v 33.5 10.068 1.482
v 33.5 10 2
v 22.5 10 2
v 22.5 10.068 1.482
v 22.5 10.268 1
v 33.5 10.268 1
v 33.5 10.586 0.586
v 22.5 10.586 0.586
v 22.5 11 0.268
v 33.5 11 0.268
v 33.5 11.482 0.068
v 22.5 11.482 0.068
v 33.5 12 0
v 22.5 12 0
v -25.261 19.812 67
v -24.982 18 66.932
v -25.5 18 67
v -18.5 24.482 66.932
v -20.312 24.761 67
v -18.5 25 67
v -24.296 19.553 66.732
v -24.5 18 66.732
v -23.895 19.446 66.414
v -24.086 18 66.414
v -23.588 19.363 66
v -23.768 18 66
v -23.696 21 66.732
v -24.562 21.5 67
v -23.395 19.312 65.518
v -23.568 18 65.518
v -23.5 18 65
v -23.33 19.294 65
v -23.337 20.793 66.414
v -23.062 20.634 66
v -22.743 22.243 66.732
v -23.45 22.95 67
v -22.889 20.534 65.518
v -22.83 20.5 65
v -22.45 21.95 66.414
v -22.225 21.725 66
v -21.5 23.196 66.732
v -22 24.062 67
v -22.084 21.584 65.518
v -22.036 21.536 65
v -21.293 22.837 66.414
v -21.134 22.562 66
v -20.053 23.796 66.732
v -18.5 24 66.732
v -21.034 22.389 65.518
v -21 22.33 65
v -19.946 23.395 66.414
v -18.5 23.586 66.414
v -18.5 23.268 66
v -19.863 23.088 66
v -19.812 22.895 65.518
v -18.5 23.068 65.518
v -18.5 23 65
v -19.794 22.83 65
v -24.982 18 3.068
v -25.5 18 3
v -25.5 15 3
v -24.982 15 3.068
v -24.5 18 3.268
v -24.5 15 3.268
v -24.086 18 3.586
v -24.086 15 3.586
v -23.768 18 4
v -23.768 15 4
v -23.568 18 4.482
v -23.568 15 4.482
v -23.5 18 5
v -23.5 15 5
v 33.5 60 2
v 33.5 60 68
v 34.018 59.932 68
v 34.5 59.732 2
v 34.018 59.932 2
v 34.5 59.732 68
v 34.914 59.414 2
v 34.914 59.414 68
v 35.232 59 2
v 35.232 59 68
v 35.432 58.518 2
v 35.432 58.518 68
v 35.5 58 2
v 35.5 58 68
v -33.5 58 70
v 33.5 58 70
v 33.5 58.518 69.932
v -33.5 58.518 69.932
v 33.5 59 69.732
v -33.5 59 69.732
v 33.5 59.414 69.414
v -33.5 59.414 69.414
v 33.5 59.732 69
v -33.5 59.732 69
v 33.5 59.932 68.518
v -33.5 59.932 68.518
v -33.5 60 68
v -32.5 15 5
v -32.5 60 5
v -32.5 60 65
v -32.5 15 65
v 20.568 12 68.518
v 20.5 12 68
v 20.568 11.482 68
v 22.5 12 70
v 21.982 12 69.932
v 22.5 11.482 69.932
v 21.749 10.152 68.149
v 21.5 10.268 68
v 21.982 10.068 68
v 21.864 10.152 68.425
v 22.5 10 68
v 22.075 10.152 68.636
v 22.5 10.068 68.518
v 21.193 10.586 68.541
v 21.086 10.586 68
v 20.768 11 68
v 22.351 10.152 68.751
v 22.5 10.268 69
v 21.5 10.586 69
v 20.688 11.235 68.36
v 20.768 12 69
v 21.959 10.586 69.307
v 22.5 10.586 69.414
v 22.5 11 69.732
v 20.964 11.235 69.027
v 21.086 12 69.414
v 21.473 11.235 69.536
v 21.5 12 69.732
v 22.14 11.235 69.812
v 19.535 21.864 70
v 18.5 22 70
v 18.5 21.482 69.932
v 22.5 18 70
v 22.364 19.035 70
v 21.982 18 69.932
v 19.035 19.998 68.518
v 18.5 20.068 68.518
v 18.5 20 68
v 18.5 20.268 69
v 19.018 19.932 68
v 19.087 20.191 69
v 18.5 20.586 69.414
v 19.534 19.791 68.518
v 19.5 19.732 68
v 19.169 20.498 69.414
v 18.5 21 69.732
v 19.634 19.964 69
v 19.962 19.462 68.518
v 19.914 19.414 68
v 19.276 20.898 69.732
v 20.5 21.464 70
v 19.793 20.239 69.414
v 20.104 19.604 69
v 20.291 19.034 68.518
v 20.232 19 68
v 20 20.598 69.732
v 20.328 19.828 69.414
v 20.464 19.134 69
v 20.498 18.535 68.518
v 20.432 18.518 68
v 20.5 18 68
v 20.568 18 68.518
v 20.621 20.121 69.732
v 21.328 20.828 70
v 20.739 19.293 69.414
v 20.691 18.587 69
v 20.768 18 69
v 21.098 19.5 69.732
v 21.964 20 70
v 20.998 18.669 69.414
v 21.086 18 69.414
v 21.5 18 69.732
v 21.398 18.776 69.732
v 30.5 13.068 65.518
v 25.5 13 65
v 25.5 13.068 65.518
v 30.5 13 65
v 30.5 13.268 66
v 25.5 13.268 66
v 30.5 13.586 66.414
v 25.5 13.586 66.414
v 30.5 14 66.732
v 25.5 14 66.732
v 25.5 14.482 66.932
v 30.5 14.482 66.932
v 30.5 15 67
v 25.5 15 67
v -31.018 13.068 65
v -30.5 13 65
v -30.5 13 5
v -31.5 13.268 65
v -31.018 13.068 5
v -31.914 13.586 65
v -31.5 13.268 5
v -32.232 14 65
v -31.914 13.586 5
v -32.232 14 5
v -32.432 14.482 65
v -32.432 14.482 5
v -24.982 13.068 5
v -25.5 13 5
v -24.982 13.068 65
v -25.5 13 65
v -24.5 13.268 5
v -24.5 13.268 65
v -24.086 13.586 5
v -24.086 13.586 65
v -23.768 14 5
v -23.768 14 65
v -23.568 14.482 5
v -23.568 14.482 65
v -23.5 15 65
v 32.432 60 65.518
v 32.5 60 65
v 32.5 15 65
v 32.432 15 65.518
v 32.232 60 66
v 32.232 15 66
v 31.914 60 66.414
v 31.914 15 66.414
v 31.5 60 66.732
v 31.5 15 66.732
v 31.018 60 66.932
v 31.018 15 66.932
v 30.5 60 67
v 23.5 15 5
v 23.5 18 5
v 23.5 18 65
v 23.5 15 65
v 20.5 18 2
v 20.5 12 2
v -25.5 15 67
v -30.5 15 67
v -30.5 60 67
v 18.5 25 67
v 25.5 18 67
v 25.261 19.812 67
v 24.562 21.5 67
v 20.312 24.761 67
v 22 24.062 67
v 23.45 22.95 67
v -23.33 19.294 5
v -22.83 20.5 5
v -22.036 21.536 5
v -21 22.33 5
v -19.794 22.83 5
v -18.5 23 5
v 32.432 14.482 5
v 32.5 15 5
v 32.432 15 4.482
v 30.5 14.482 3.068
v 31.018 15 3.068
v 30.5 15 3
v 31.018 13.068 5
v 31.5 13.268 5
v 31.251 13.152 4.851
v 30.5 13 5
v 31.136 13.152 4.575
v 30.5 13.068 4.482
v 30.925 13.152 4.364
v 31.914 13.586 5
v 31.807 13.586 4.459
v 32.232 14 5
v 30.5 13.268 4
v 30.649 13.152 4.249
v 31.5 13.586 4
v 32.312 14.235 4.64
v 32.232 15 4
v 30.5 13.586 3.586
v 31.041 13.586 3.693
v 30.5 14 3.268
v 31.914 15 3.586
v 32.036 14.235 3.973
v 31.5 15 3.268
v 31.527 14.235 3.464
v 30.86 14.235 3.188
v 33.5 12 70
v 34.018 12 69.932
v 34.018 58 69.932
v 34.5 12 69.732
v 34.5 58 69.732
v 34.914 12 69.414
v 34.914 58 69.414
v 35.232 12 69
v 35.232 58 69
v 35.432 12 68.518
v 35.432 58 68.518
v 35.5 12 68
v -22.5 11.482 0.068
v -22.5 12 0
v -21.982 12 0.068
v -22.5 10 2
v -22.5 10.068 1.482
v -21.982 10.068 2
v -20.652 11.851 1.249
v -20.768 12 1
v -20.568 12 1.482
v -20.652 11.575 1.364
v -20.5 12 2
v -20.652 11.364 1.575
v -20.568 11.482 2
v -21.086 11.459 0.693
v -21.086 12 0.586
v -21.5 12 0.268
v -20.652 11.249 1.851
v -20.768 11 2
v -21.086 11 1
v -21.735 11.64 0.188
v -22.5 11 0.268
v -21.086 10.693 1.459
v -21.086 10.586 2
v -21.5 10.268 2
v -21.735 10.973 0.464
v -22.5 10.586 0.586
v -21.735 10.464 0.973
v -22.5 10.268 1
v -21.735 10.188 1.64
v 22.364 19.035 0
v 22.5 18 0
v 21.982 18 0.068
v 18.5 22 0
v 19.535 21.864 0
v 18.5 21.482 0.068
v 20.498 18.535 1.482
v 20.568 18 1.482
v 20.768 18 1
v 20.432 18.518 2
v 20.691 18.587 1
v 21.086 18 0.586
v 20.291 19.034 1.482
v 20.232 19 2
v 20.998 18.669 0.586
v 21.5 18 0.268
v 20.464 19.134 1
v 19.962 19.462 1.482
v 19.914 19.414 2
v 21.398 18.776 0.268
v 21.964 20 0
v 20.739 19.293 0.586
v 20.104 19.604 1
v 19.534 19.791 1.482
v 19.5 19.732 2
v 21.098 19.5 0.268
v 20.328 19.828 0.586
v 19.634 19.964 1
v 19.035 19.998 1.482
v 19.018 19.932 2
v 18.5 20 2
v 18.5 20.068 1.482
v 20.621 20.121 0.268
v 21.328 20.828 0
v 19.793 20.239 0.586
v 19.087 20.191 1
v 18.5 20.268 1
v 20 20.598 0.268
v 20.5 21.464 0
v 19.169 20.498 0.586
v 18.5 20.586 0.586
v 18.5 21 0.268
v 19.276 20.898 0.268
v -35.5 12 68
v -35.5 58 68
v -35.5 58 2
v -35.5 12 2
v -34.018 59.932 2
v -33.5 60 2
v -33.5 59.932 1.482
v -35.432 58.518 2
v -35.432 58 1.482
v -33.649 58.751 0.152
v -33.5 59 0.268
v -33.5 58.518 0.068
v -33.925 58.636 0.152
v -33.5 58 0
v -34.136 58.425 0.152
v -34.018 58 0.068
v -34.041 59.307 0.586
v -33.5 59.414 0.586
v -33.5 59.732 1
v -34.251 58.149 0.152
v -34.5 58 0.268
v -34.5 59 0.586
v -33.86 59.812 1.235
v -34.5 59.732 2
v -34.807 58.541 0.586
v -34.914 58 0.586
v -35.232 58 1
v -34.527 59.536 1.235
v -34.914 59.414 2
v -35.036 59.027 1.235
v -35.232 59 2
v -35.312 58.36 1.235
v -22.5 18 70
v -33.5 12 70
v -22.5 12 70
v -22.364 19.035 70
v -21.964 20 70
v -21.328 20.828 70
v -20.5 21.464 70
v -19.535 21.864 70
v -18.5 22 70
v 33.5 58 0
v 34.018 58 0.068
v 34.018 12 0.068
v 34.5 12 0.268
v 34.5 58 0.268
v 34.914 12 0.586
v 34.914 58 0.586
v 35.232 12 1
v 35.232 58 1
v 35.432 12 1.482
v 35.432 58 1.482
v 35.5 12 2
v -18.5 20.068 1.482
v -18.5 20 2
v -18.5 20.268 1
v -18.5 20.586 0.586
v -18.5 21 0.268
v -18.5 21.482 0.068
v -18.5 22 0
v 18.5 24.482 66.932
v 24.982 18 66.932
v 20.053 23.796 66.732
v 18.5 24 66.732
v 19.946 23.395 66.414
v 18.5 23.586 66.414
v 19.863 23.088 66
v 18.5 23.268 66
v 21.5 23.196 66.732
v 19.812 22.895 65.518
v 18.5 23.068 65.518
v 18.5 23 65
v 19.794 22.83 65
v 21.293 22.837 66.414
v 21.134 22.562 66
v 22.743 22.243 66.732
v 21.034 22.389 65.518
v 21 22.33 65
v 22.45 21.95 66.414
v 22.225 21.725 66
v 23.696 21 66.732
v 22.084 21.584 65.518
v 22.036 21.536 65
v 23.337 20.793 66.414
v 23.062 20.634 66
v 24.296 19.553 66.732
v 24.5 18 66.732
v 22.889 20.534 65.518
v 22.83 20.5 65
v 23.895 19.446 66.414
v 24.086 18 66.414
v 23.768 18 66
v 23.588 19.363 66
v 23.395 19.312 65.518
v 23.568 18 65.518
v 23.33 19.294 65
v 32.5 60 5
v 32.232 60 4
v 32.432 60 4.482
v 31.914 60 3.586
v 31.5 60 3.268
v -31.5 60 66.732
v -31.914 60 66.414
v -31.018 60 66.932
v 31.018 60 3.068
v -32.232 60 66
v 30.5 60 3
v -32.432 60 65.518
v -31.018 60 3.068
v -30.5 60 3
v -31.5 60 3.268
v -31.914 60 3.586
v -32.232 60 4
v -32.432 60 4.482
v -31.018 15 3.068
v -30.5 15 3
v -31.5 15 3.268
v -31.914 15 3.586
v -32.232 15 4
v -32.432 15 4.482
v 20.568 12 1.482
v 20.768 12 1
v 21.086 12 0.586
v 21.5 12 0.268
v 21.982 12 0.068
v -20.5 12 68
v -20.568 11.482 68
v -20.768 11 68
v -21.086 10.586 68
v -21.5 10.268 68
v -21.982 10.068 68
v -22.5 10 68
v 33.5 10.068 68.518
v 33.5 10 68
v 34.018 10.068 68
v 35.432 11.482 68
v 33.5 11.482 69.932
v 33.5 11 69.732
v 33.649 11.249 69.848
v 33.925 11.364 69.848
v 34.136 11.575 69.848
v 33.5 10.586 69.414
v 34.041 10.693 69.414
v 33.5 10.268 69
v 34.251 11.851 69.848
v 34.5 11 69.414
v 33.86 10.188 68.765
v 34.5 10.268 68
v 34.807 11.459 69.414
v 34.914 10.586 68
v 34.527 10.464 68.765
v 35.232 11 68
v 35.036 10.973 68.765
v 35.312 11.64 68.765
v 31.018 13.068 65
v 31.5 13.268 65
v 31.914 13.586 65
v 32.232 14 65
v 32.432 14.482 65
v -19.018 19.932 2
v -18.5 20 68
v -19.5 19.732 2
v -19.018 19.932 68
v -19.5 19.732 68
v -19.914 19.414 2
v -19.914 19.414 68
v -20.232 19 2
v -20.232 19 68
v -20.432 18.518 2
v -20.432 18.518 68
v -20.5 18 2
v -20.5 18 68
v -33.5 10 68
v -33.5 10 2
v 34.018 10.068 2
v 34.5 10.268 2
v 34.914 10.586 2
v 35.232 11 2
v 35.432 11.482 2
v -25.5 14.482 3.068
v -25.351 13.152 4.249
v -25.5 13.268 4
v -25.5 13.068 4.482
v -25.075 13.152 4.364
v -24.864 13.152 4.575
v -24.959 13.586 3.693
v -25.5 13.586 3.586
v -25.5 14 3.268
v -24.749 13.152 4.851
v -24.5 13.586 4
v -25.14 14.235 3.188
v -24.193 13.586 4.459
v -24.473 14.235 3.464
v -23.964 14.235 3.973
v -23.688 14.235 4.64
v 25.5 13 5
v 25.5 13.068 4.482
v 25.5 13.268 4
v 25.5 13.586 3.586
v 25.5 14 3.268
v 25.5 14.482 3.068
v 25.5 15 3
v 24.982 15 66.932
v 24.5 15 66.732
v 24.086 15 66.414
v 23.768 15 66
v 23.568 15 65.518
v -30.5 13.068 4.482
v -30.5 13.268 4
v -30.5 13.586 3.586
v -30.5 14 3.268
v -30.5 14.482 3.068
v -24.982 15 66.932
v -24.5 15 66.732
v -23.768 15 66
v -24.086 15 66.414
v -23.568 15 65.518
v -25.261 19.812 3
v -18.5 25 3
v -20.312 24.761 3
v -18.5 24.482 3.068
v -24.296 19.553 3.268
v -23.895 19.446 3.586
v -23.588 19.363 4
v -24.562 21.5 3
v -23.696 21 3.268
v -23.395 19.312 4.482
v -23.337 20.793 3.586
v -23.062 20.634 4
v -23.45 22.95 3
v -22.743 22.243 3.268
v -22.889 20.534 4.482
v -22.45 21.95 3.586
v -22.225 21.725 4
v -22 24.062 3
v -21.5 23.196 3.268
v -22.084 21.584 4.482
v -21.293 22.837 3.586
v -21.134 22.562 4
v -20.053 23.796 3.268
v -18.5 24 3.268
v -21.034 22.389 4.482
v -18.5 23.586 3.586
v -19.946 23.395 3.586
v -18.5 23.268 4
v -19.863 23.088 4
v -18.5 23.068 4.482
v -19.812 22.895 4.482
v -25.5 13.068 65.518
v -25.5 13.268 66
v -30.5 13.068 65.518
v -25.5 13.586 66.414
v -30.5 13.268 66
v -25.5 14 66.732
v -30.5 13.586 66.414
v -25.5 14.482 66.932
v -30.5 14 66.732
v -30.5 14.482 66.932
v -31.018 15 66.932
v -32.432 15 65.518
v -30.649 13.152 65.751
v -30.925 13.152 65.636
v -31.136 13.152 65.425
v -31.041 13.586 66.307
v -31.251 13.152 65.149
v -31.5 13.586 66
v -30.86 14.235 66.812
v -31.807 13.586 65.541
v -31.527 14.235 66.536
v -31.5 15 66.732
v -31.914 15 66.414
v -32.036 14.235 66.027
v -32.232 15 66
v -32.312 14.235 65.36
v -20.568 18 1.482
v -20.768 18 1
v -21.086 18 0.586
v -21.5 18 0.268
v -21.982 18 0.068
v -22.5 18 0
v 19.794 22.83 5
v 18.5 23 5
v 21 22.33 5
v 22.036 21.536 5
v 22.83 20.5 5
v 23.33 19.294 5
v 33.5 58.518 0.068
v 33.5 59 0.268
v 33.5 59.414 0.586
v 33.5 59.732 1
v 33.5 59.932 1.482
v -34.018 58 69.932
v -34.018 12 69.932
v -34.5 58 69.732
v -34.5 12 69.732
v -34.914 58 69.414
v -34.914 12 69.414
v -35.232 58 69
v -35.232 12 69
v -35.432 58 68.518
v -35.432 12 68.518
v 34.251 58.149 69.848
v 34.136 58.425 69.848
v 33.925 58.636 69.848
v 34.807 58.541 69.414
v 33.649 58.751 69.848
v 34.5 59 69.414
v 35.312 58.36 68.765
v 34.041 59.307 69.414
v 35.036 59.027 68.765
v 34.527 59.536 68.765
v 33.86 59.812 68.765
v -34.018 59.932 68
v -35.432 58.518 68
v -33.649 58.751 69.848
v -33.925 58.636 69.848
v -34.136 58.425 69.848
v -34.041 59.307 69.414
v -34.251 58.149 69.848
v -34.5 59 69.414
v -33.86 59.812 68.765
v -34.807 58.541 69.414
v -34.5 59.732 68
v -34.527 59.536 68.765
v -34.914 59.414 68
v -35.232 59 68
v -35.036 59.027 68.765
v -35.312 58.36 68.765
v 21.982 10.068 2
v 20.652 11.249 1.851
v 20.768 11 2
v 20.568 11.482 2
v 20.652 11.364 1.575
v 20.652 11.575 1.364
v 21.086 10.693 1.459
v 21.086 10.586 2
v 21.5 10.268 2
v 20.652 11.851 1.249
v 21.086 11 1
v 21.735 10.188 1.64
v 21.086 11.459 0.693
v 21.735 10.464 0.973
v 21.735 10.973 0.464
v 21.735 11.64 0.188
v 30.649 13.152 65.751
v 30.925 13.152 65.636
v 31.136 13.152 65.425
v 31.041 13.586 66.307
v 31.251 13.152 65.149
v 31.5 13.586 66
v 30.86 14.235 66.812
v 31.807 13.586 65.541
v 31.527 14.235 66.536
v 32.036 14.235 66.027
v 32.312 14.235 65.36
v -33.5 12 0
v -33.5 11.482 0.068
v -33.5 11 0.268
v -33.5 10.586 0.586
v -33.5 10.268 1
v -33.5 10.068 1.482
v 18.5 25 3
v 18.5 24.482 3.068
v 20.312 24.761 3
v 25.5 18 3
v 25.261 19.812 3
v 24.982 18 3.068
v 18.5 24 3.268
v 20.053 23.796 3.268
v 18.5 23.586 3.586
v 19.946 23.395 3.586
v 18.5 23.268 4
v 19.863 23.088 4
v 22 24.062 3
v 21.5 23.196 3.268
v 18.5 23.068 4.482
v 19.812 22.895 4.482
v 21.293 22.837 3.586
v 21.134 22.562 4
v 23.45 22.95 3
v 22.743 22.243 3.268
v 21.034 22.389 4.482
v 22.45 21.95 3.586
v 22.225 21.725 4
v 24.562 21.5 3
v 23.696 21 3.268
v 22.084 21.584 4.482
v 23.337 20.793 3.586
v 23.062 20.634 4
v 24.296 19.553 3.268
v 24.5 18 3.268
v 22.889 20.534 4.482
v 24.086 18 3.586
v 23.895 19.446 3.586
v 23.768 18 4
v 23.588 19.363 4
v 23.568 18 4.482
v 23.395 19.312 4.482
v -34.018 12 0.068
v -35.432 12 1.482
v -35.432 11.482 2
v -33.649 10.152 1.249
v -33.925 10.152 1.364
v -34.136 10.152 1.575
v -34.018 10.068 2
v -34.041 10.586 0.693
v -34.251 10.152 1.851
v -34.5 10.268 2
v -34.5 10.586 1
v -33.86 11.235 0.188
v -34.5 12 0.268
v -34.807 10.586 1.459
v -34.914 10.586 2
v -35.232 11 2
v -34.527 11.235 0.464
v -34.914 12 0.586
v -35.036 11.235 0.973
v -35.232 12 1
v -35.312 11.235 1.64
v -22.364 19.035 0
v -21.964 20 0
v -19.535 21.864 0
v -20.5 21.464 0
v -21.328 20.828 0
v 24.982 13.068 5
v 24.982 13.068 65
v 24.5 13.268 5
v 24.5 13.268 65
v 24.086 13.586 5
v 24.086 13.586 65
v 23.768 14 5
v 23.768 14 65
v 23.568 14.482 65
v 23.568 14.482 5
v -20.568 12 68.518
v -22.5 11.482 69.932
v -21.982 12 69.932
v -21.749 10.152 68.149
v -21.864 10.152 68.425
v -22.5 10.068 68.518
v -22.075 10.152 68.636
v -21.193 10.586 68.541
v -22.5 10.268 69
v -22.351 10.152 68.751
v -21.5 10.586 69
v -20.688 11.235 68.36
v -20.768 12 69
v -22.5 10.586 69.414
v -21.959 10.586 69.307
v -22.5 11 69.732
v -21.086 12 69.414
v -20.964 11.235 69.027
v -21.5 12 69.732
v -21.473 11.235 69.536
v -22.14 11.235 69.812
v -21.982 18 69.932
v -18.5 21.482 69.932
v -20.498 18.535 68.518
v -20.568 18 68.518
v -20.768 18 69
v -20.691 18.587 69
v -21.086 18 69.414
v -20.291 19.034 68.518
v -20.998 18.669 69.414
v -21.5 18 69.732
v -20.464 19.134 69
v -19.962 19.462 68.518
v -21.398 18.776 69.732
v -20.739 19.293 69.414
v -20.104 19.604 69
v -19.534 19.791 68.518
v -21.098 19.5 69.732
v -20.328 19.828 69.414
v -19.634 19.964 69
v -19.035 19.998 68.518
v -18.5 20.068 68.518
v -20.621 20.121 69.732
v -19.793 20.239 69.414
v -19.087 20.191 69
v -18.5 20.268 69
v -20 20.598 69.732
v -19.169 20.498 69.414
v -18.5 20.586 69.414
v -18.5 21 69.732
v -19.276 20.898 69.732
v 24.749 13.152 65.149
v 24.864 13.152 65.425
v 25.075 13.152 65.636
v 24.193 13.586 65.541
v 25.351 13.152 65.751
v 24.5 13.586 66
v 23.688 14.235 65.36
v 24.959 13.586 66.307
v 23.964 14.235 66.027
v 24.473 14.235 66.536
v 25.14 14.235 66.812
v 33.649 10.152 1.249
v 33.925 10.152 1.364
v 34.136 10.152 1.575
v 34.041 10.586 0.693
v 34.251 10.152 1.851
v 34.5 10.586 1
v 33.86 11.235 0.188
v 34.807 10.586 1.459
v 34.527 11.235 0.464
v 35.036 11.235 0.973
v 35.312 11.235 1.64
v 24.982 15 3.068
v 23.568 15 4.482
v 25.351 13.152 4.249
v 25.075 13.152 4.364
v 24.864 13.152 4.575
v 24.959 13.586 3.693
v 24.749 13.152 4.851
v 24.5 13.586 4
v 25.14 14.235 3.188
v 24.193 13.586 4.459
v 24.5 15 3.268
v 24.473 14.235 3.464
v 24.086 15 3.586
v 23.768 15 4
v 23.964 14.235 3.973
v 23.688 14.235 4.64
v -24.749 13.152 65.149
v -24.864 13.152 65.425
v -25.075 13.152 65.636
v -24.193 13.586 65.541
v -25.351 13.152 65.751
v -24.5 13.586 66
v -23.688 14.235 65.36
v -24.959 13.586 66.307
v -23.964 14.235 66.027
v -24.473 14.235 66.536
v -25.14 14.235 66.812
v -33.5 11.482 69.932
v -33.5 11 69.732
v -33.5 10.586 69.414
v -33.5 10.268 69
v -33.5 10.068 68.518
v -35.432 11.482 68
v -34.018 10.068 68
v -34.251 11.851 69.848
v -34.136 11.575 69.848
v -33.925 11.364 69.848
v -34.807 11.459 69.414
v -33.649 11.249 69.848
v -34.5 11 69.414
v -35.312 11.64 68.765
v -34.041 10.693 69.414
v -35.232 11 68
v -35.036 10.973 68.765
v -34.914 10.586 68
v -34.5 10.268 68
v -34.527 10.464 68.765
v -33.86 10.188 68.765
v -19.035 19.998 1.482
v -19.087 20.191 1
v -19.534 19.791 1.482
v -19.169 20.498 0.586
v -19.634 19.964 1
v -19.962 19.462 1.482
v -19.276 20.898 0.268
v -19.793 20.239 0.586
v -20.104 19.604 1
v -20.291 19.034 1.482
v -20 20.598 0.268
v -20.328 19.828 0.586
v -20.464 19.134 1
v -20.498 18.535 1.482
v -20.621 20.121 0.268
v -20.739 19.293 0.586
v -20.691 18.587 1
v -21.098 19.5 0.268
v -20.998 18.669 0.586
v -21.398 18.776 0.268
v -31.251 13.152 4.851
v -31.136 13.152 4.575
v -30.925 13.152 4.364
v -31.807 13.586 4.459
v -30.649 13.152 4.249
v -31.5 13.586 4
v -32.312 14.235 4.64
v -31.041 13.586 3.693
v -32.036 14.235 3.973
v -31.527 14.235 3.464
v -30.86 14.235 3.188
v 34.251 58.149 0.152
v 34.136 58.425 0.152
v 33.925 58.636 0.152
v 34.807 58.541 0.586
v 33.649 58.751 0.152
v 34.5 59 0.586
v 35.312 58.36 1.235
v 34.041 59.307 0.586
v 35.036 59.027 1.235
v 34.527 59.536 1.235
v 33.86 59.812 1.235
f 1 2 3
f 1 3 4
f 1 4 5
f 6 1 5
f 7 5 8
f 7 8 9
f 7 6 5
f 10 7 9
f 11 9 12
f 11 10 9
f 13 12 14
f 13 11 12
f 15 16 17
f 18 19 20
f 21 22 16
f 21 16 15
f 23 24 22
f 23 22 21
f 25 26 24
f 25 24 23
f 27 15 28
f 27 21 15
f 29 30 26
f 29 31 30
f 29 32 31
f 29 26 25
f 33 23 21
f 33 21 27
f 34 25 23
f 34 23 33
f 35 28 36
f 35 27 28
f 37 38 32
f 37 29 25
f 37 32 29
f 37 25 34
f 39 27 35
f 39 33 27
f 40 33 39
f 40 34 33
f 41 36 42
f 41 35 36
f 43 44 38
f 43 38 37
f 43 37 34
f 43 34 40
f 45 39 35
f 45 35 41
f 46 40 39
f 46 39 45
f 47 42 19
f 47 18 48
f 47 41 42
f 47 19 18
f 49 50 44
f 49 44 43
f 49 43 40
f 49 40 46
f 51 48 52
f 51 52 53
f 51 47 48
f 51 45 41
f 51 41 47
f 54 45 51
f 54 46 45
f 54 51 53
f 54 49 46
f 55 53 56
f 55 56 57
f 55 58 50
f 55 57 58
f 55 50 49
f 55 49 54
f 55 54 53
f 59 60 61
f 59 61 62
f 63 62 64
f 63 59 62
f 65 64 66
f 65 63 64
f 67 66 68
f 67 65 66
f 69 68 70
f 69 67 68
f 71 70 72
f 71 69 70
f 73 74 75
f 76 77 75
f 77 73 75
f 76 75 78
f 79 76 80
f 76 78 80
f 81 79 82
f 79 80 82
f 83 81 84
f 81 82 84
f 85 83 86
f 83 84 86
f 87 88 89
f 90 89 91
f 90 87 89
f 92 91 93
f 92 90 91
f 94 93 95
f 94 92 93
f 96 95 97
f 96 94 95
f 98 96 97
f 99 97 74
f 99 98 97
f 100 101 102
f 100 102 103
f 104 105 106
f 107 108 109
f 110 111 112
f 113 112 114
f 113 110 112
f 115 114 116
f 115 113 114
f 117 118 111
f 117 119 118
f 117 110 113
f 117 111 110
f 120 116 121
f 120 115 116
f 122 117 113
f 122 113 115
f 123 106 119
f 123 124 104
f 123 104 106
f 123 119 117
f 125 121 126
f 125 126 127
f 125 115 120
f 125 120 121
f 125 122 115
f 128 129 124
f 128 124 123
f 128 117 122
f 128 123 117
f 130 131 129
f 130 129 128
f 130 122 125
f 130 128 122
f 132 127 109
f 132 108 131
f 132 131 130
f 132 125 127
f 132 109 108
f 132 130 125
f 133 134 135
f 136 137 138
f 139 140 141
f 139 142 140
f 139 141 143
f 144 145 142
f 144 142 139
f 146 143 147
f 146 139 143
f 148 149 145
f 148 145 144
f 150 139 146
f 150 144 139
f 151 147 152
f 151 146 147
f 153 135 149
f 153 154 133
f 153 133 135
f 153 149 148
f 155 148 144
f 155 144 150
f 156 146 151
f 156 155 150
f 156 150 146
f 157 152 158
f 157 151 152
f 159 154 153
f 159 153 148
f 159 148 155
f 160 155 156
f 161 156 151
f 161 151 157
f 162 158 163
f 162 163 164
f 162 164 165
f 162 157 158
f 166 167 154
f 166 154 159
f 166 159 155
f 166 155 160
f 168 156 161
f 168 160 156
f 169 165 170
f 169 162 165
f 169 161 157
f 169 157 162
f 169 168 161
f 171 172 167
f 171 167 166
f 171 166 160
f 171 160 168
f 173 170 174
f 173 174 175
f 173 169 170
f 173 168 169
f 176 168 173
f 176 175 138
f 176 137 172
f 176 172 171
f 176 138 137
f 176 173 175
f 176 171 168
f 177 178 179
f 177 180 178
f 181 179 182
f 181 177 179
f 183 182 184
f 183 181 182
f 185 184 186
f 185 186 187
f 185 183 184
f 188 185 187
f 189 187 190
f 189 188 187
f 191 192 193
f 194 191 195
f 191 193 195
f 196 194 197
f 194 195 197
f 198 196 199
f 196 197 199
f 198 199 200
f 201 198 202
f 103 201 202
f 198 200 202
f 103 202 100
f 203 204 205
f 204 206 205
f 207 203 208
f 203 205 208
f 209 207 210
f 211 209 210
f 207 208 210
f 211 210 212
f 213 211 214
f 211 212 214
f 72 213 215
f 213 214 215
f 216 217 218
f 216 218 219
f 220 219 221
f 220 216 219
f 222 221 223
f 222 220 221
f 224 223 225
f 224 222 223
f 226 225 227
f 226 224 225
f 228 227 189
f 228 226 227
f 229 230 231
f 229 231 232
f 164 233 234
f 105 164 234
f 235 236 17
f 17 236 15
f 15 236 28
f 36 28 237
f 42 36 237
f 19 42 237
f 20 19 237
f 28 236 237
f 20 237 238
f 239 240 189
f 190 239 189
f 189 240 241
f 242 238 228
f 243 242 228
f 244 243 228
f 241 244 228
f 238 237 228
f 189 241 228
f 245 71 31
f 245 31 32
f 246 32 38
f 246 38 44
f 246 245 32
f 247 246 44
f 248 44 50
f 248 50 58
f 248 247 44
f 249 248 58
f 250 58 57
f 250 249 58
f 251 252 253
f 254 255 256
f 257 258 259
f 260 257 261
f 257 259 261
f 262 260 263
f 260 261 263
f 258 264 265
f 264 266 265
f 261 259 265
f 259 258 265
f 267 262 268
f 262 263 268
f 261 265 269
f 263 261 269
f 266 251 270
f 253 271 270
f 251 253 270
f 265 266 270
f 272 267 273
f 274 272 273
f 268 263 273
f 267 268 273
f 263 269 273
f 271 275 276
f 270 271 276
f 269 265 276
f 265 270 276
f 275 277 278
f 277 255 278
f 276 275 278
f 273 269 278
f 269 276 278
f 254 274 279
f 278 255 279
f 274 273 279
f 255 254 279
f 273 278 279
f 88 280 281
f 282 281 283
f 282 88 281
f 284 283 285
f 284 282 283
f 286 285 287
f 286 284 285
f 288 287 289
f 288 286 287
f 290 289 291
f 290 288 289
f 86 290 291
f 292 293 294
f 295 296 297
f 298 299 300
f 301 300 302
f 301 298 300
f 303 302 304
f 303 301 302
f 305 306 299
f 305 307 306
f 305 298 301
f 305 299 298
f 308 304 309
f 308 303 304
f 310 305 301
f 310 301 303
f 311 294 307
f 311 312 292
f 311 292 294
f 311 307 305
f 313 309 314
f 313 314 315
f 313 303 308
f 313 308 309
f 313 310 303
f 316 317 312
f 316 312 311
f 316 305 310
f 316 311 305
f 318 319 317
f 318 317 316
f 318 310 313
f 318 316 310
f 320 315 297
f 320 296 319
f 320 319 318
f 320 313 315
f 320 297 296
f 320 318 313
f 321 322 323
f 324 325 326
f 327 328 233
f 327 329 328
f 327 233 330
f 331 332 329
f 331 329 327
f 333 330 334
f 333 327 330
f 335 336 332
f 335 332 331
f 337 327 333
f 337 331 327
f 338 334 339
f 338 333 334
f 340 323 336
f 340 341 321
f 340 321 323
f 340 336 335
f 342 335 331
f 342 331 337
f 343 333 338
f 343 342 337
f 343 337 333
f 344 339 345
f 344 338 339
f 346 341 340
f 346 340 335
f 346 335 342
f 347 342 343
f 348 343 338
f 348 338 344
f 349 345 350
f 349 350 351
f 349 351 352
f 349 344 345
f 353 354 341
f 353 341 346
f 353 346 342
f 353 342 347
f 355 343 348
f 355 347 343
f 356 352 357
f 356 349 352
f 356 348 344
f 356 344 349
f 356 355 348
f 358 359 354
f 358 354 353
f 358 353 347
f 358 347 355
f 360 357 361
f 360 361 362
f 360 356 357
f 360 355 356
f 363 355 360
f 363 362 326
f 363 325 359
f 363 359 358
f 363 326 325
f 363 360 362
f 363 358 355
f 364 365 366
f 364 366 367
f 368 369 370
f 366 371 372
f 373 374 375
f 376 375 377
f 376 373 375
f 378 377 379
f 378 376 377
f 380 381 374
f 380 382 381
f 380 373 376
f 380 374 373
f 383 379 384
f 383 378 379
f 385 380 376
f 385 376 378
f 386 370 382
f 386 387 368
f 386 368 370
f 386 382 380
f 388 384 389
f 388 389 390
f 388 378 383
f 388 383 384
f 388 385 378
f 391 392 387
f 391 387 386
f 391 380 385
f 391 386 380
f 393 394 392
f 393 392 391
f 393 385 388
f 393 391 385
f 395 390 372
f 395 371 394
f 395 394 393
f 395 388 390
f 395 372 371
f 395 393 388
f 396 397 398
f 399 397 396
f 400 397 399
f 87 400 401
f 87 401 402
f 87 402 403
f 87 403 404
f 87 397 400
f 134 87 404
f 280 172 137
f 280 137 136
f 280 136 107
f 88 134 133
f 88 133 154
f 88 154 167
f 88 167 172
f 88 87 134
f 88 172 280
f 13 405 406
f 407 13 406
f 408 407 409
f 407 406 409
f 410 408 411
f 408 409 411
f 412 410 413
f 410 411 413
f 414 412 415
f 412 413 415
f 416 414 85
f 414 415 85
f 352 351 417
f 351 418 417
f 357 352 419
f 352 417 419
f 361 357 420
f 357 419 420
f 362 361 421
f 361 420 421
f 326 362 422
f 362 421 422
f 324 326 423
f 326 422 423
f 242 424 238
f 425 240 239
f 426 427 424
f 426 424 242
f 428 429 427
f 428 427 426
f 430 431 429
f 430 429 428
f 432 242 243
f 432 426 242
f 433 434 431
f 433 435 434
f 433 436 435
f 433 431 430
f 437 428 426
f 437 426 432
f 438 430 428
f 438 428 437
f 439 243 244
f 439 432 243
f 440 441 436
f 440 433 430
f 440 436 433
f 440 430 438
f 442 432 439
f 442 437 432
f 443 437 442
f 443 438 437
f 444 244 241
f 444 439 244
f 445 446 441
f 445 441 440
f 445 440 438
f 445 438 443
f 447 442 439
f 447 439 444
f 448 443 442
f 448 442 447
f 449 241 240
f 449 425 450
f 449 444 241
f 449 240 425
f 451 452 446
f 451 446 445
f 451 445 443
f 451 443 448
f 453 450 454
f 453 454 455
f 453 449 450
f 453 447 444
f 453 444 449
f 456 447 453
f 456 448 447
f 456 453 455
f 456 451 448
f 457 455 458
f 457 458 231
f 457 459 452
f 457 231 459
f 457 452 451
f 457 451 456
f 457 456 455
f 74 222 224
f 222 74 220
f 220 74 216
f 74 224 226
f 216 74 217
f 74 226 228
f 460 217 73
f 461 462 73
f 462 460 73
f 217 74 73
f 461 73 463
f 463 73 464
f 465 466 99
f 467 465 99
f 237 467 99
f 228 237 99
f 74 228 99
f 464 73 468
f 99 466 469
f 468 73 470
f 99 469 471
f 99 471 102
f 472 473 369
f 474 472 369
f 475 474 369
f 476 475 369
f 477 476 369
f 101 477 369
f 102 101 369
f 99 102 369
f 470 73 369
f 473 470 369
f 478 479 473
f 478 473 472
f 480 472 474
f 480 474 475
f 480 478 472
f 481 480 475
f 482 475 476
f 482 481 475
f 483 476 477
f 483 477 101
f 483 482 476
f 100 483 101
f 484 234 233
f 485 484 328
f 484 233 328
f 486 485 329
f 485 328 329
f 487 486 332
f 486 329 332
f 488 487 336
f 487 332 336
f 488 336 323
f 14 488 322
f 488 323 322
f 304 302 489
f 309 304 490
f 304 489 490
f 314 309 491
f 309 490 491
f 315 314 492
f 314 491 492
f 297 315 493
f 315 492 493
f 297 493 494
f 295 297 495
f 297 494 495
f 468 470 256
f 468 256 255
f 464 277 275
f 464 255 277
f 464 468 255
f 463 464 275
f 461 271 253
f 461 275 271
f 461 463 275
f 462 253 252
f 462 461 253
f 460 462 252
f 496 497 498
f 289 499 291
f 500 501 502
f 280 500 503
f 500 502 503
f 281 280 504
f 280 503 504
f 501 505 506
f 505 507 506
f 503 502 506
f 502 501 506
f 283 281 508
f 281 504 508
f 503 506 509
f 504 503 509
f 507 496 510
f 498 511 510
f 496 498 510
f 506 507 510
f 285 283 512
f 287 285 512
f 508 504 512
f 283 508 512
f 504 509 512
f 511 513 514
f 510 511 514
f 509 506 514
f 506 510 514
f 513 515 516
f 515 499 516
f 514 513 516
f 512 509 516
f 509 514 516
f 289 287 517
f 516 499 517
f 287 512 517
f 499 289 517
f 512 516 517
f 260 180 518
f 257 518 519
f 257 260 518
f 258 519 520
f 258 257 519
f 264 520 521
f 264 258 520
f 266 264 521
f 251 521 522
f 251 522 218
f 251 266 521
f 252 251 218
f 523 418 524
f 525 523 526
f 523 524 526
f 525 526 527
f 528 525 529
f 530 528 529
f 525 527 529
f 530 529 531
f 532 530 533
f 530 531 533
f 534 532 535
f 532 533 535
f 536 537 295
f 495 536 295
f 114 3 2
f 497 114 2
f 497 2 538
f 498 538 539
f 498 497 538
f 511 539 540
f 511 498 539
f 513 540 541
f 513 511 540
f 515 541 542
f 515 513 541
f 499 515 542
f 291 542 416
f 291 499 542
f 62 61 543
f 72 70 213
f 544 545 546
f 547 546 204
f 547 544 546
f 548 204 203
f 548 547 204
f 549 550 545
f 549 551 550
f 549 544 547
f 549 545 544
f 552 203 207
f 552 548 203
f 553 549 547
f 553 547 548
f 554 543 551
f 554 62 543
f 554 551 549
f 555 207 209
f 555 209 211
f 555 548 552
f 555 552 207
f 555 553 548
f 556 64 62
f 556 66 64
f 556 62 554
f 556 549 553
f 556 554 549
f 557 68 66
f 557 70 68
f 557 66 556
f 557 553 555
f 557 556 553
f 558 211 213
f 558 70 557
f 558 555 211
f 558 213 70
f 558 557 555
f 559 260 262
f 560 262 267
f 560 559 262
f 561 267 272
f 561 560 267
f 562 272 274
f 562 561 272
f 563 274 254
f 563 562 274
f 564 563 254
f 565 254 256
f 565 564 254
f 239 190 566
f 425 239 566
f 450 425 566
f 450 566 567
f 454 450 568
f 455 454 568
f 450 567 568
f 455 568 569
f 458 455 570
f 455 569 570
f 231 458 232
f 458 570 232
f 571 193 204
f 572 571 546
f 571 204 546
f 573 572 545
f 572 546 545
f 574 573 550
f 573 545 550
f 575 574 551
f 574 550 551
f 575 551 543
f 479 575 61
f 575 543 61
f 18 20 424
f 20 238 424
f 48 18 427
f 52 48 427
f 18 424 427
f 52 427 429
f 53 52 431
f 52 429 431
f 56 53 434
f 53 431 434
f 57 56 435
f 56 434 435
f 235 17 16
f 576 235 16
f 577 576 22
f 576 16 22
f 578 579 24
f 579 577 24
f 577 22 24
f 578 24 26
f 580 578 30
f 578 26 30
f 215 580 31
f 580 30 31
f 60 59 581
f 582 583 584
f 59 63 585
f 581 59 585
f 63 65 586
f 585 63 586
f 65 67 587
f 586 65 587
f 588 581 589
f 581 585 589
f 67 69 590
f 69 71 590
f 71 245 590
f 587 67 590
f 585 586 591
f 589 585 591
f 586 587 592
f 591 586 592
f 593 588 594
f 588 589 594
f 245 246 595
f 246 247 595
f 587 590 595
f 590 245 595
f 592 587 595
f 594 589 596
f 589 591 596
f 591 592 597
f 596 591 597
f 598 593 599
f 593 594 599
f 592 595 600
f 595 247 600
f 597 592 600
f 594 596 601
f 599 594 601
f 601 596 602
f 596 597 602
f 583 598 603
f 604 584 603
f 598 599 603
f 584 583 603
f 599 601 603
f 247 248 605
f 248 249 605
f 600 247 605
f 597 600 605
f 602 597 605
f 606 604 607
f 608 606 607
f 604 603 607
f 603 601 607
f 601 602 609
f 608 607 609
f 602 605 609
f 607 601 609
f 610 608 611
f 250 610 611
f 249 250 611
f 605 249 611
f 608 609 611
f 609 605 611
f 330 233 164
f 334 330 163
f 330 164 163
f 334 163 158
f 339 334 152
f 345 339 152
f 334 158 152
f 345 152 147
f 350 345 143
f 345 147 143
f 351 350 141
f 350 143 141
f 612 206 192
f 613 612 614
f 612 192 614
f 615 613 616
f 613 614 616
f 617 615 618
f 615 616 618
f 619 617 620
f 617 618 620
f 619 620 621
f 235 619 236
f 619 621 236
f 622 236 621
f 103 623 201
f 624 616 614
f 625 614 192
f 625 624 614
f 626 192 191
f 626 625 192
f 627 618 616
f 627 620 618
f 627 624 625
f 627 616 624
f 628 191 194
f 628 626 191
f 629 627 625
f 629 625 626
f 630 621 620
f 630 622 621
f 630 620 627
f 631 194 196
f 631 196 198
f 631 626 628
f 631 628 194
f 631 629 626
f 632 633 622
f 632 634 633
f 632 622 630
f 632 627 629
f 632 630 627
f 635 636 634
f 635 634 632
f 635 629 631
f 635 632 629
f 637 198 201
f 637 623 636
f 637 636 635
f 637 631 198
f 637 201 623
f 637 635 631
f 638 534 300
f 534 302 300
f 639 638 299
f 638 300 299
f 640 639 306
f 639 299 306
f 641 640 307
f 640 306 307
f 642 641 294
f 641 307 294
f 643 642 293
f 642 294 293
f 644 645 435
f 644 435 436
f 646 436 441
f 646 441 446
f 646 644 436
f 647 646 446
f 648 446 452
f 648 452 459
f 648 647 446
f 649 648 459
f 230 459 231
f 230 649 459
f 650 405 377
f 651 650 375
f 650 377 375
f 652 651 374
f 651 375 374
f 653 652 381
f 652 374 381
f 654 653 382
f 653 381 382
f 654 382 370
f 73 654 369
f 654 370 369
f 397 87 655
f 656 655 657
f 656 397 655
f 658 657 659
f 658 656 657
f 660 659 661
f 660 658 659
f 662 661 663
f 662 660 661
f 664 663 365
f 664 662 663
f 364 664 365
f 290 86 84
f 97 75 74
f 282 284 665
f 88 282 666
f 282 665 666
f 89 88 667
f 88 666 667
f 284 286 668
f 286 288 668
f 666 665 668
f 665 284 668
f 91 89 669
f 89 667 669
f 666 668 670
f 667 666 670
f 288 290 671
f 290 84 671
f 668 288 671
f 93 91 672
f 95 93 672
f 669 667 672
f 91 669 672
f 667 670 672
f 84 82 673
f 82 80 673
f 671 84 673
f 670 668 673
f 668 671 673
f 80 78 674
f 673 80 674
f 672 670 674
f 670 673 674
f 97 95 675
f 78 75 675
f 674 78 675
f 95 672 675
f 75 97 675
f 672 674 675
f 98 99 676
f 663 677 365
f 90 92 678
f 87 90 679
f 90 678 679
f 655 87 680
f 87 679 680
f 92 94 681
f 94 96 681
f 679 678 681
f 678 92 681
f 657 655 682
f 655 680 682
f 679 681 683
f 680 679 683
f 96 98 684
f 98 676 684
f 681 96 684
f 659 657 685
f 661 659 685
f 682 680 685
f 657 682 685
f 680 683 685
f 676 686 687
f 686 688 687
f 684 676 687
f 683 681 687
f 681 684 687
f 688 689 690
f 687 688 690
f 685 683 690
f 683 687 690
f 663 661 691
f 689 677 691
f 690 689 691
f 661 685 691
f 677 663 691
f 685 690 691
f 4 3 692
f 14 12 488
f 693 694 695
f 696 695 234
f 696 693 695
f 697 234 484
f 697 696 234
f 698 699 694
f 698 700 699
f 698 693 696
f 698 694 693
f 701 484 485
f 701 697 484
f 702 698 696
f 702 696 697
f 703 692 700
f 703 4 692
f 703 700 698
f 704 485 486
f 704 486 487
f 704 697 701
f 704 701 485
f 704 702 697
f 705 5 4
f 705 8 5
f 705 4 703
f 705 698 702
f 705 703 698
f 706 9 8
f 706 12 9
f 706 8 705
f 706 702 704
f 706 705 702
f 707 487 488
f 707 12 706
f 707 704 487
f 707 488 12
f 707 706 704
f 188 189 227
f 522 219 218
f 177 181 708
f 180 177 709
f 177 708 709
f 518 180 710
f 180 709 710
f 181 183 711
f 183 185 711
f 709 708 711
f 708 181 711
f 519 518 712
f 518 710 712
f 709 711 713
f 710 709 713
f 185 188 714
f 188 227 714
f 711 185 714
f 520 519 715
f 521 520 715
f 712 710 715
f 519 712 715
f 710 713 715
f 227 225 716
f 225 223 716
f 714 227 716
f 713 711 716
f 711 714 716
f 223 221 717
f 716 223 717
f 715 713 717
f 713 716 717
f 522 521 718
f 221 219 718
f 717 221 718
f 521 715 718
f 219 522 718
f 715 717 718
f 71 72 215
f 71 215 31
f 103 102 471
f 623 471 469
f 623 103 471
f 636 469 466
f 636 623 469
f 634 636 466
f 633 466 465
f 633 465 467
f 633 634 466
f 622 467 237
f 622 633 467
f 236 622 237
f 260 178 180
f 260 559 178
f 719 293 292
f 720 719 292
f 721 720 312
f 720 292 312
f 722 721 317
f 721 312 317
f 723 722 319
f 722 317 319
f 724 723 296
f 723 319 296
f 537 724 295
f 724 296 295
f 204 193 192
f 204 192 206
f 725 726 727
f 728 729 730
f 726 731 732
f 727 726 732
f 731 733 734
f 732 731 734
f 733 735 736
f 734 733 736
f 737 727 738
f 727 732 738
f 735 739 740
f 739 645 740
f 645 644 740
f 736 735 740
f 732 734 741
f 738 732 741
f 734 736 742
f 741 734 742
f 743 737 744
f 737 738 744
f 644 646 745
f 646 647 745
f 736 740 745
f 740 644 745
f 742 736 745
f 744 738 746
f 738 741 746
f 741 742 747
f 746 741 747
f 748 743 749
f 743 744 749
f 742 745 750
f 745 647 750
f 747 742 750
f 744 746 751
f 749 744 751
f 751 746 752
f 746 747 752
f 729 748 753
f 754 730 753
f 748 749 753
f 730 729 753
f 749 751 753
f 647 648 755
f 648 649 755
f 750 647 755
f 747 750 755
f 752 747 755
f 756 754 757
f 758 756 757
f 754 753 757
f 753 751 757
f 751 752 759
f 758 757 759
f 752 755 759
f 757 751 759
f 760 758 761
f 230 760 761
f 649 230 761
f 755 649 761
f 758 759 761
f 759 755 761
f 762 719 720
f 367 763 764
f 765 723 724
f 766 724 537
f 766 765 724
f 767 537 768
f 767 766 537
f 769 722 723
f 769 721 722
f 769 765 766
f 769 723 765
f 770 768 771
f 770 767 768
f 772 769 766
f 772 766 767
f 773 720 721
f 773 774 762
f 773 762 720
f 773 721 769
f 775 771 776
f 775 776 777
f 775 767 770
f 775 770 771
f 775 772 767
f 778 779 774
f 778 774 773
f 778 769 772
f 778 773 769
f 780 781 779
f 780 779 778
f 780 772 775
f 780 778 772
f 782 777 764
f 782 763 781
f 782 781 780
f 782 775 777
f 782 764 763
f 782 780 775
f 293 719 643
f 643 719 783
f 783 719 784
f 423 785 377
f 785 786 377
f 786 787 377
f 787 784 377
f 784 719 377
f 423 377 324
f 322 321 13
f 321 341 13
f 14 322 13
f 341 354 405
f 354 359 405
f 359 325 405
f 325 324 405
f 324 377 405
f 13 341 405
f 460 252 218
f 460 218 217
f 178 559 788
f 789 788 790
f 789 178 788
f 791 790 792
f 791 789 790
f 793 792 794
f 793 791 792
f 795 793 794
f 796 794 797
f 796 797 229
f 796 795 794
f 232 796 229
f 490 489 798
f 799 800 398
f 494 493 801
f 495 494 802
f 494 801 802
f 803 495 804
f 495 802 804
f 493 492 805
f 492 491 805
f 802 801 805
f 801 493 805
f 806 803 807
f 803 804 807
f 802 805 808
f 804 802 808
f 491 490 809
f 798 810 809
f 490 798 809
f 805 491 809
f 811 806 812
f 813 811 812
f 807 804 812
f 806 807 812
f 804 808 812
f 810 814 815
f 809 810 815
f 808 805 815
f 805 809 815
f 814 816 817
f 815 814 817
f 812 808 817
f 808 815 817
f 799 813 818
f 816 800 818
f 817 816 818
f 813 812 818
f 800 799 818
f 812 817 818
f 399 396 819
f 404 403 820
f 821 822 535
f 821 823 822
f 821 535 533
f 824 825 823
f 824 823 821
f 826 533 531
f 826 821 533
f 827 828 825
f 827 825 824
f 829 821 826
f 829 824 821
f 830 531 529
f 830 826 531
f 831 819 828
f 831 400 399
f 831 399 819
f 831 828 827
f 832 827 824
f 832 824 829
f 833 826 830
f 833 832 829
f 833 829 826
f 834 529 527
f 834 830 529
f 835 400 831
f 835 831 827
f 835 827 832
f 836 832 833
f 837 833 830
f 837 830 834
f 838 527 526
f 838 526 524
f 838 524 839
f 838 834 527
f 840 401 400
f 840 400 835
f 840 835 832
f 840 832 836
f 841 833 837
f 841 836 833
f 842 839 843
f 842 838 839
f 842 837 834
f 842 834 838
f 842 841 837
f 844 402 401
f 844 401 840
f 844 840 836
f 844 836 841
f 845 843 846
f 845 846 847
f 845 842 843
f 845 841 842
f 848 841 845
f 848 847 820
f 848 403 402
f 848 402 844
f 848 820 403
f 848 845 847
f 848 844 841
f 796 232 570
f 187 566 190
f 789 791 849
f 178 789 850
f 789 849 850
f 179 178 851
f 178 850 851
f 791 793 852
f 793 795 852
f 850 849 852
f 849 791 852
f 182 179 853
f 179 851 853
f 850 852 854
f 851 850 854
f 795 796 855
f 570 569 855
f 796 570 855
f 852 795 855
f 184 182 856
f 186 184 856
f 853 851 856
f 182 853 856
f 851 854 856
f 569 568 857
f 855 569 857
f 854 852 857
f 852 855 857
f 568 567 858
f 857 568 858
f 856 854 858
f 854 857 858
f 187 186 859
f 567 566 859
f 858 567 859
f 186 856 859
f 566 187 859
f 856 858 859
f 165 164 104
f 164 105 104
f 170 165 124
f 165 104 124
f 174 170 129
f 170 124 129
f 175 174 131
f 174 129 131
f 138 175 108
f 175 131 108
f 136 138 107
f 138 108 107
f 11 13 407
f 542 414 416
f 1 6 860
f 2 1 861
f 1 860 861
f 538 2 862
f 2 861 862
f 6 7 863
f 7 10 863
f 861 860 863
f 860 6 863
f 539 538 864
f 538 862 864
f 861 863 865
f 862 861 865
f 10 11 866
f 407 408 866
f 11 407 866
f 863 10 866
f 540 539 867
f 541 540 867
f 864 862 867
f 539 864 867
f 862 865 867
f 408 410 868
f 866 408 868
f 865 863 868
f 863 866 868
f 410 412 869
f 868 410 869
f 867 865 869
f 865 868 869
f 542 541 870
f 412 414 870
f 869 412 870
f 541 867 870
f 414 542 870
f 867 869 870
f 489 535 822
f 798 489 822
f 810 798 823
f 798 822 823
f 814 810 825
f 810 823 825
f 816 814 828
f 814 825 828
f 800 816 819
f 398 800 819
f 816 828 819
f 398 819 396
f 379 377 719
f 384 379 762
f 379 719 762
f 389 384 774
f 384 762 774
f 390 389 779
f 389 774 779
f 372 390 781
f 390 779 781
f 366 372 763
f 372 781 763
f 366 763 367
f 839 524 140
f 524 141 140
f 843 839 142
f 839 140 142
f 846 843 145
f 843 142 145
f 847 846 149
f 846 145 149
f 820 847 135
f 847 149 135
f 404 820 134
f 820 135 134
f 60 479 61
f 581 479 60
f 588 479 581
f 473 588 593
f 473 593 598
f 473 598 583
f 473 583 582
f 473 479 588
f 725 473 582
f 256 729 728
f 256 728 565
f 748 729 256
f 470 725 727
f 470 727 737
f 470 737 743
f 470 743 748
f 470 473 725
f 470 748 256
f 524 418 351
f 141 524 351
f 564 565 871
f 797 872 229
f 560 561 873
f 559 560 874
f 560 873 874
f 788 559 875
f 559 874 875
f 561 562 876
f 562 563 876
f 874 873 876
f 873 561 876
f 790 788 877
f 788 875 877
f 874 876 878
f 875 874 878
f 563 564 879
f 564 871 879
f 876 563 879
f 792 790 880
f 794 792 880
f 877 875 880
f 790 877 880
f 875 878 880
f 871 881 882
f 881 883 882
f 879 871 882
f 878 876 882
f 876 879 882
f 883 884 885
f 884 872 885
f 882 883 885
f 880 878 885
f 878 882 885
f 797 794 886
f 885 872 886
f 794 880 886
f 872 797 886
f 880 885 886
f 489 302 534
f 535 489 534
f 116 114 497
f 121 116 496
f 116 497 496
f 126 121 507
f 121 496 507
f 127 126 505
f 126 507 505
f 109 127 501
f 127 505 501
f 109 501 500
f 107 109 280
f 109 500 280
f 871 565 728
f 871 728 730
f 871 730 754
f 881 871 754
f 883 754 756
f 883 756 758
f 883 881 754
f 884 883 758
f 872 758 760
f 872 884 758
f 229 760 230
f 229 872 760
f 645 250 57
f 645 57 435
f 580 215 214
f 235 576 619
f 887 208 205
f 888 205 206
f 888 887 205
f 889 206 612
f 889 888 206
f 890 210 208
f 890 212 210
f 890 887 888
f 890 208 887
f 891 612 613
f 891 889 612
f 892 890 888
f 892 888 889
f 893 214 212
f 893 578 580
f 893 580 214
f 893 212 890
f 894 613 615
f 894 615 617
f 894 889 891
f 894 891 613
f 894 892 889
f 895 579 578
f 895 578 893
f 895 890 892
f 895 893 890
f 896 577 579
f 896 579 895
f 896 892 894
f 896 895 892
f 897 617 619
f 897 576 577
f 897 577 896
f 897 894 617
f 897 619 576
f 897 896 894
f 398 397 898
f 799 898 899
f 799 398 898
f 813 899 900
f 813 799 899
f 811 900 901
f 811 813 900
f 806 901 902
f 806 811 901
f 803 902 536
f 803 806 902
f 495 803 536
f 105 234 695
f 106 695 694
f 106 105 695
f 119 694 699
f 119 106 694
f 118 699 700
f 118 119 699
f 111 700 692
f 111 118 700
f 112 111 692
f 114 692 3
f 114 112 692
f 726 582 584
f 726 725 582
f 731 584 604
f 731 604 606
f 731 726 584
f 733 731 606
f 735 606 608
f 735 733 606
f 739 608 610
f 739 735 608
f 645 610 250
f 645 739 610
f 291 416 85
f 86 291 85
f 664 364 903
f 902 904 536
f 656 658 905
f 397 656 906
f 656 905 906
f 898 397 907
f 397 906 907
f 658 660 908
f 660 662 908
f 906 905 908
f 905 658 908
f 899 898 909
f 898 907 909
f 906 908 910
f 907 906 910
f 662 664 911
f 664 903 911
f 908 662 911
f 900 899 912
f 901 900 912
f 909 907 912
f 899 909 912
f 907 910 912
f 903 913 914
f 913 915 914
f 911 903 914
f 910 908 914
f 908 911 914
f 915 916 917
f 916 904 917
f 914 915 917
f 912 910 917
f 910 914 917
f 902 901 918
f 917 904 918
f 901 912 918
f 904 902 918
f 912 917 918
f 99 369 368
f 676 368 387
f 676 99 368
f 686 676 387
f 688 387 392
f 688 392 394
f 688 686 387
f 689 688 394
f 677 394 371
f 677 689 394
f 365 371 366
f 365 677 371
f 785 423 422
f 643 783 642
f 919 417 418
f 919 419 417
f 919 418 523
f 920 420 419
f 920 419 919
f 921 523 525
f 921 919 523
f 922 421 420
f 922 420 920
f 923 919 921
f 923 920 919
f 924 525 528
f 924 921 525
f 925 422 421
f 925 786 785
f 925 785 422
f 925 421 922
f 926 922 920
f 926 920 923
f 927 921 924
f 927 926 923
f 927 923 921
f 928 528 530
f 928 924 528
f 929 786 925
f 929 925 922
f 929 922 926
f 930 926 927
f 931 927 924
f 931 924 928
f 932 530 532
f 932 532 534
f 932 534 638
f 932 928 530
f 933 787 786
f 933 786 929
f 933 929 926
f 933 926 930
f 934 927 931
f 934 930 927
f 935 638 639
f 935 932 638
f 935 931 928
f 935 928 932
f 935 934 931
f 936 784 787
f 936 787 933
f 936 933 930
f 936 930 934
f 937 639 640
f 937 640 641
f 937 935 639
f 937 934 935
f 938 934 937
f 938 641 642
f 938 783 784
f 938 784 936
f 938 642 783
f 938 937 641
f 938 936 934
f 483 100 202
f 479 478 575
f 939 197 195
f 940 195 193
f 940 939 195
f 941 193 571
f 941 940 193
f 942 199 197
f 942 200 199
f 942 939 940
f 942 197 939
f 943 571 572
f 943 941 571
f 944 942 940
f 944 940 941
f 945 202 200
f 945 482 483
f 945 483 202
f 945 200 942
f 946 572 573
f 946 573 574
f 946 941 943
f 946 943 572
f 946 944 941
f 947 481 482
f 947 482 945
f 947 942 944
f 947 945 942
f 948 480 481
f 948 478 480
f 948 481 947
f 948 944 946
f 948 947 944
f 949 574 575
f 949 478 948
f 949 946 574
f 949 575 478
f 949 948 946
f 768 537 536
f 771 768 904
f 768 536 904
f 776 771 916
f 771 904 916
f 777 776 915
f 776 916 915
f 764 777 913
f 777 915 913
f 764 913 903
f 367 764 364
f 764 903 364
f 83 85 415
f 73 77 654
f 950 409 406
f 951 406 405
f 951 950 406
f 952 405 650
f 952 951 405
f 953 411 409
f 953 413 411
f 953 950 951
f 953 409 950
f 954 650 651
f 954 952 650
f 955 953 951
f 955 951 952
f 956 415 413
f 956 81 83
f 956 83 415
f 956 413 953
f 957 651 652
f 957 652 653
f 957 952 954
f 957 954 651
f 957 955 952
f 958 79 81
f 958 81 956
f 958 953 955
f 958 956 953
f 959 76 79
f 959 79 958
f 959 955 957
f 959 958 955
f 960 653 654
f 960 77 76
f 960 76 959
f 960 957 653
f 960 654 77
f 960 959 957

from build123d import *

# Parameters (mm, degrees)
BOSS_EXTRU_2_DEPTH = 70
CONG_4_R           = 2
CONG_3_R           = 2
CONG_5_R           = 2
CONG_6_R           = 2
COQUE1_START       = 3
COQUE1_DEPTH       = 64
CONG_7_R           = 2
CONG_8_R           = 2
CONG_11_R          = 2
CONG_12_R          = 2
CONG_13_R          = 2


# Read off the part's stored shape, not the designer's step: Coque1
with BuildPart() as part:
    # Esquisse2 → Boss.-Extru.2 (new body)
    with BuildSketch(Plane.XY):
        Polygon((-35.5, 10), (-20.5, 10), (-20.5, 20), (20.5, 20), (20.5, 10), (35.5, 10), (35.5, 60), (-35.5, 60), align=None)
    extrude(amount=BOSS_EXTRU_2_DEPTH)

    # Congé4
    cong_4_edges = [part.edges().sort_by_distance(p)[0] for p in [
        (-35.5, 60, 35),
    ]]
    fillet(cong_4_edges, radius=CONG_4_R)

    # Congé3
    cong_3_edges = [part.edges().sort_by_distance(p)[0] for p in [
        (35.5, 60, 35),
    ]]
    fillet(cong_3_edges, radius=CONG_3_R)

    # Congé5
    cong_5_edges = [part.edges().sort_by_distance(p)[0] for p in [
        (20.5, 20, 35),
    ]]
    fillet(cong_5_edges, radius=CONG_5_R)

    # Congé6
    cong_6_edges = [part.edges().sort_by_distance(p)[0] for p in [
        (-20.5, 20, 35),
    ]]
    fillet(cong_6_edges, radius=CONG_6_R)

    # Coque1 outline → Coque1 (cut)
    with BuildSketch(Plane.XY.offset(COQUE1_START)):
        with BuildLine():
            Line((-32.5, 60), (-32.5, 13))
            Line((-32.5, 13), (-23.5, 13))
            Line((-23.5, 13), (-23.5, 18))
            ThreePointArc((-23.5, 18), (-22.035533906, 21.535533906), (-18.5, 23))
            Line((-18.5, 23), (18.5, 23))
            ThreePointArc((18.5, 23), (22.035533906, 21.535533906), (23.5, 18))
            Line((23.5, 18), (23.5, 13))
            Line((23.5, 13), (32.5, 13))
            Line((32.5, 13), (32.5, 60))
            Line((32.5, 60), (-32.5, 60))
        make_face()
    extrude(amount=COQUE1_DEPTH, mode=Mode.SUBTRACT)

    # Congé7
    cong_7_edges = [part.edges().sort_by_distance(p)[0] for p in [
        (35.5, 34, 0),
        (34.914213562, 59.414213562, 0),
        (0, 60, 0),
        (-34.914213562, 59.414213562, 0),
        (-28, 10, 0),
        (-35.5, 10, 35),
        (-35.5, 34, 0),
    ]]
    fillet(cong_7_edges, radius=CONG_7_R)

    # Congé8
    cong_8_edges = [part.edges().sort_by_distance(p)[0] for p in [
        (-20.5, 14, 70),
        (35.5, 10, 36),
        (20.5, 10, 35),
        (-20.5, 10, 36),
        (28, 10, 70),
        (35.5, 34, 70),
        (-35.5, 35, 70),
        (-34.914213562, 59.414213562, 70),
        (0, 60, 70),
        (34.914213562, 59.414213562, 70),
        (20.5, 14, 0),
        (20.5, 14, 70),
        (19.914213562, 19.414213562, 0),
        (19.914213562, 19.414213562, 70),
        (0, 20, 0),
        (0, 20, 70),
        (-19.914213562, 19.414213562, 0),
        (-19.914213562, 19.414213562, 70),
        (-20.5, 15, 0),
        (34.914213562, 10, 0.585786438),
        (-27, 10, 70),
        (-20.5, 10.585786438, 0.585786438),
        (-34.914213562, 10.585786438, 70),
        (27, 10, 0),
    ]]
    fillet(cong_8_edges, radius=CONG_8_R)

    # Congé11
    cong_11_edges = [part.edges().sort_by_distance(p)[0] for p in [
        (-23.5, 15.5, 3),
        (0, 23, 3),
        (23.5, 15.5, 3),
        (-23.5, 15.5, 67),
        (-22.035533906, 21.535533906, 67),
        (0, 23, 67),
        (22.035533906, 21.535533906, 67),
        (23.5, 15.5, 67),
        (22.035533906, 21.535533906, 3),
        (-22.035533906, 21.535533906, 3),
    ]]
    fillet(cong_11_edges, radius=CONG_11_R)

    # Congé12
    cong_12_edges = [part.edges().sort_by_distance(p)[0] for p in [
        (-32.5, 36.5, 3),
        (32.5, 36.5, 3),
        (32.5, 36.5, 67),
        (-32.5, 36.5, 67),
    ]]
    fillet(cong_12_edges, radius=CONG_12_R)

    # Congé13
    cong_13_edges = [part.edges().sort_by_distance(p)[0] for p in [
        (-23.5, 13, 35),
        (28, 13, 67),
        (-24.085786438, 13, 3.585786438),
        (-24.085786438, 13, 66.414213562),
        (23.5, 13, 35),
        (28, 13, 3),
        (24.085786438, 13, 3.585786438),
        (24.085786438, 13, 66.414213562),
        (-32.5, 13, 35),
        (-28, 13, 67),
        (-28, 13, 3),
        (-31.914213562, 13, 3.585786438),
        (-31.914213562, 13, 66.414213562),
        (32.5, 13, 35),
        (31.914213562, 13, 3.585786438),
        (31.914213562, 13, 66.414213562),
    ]]
    fillet(cong_13_edges, radius=CONG_13_R)


solid = part.part
